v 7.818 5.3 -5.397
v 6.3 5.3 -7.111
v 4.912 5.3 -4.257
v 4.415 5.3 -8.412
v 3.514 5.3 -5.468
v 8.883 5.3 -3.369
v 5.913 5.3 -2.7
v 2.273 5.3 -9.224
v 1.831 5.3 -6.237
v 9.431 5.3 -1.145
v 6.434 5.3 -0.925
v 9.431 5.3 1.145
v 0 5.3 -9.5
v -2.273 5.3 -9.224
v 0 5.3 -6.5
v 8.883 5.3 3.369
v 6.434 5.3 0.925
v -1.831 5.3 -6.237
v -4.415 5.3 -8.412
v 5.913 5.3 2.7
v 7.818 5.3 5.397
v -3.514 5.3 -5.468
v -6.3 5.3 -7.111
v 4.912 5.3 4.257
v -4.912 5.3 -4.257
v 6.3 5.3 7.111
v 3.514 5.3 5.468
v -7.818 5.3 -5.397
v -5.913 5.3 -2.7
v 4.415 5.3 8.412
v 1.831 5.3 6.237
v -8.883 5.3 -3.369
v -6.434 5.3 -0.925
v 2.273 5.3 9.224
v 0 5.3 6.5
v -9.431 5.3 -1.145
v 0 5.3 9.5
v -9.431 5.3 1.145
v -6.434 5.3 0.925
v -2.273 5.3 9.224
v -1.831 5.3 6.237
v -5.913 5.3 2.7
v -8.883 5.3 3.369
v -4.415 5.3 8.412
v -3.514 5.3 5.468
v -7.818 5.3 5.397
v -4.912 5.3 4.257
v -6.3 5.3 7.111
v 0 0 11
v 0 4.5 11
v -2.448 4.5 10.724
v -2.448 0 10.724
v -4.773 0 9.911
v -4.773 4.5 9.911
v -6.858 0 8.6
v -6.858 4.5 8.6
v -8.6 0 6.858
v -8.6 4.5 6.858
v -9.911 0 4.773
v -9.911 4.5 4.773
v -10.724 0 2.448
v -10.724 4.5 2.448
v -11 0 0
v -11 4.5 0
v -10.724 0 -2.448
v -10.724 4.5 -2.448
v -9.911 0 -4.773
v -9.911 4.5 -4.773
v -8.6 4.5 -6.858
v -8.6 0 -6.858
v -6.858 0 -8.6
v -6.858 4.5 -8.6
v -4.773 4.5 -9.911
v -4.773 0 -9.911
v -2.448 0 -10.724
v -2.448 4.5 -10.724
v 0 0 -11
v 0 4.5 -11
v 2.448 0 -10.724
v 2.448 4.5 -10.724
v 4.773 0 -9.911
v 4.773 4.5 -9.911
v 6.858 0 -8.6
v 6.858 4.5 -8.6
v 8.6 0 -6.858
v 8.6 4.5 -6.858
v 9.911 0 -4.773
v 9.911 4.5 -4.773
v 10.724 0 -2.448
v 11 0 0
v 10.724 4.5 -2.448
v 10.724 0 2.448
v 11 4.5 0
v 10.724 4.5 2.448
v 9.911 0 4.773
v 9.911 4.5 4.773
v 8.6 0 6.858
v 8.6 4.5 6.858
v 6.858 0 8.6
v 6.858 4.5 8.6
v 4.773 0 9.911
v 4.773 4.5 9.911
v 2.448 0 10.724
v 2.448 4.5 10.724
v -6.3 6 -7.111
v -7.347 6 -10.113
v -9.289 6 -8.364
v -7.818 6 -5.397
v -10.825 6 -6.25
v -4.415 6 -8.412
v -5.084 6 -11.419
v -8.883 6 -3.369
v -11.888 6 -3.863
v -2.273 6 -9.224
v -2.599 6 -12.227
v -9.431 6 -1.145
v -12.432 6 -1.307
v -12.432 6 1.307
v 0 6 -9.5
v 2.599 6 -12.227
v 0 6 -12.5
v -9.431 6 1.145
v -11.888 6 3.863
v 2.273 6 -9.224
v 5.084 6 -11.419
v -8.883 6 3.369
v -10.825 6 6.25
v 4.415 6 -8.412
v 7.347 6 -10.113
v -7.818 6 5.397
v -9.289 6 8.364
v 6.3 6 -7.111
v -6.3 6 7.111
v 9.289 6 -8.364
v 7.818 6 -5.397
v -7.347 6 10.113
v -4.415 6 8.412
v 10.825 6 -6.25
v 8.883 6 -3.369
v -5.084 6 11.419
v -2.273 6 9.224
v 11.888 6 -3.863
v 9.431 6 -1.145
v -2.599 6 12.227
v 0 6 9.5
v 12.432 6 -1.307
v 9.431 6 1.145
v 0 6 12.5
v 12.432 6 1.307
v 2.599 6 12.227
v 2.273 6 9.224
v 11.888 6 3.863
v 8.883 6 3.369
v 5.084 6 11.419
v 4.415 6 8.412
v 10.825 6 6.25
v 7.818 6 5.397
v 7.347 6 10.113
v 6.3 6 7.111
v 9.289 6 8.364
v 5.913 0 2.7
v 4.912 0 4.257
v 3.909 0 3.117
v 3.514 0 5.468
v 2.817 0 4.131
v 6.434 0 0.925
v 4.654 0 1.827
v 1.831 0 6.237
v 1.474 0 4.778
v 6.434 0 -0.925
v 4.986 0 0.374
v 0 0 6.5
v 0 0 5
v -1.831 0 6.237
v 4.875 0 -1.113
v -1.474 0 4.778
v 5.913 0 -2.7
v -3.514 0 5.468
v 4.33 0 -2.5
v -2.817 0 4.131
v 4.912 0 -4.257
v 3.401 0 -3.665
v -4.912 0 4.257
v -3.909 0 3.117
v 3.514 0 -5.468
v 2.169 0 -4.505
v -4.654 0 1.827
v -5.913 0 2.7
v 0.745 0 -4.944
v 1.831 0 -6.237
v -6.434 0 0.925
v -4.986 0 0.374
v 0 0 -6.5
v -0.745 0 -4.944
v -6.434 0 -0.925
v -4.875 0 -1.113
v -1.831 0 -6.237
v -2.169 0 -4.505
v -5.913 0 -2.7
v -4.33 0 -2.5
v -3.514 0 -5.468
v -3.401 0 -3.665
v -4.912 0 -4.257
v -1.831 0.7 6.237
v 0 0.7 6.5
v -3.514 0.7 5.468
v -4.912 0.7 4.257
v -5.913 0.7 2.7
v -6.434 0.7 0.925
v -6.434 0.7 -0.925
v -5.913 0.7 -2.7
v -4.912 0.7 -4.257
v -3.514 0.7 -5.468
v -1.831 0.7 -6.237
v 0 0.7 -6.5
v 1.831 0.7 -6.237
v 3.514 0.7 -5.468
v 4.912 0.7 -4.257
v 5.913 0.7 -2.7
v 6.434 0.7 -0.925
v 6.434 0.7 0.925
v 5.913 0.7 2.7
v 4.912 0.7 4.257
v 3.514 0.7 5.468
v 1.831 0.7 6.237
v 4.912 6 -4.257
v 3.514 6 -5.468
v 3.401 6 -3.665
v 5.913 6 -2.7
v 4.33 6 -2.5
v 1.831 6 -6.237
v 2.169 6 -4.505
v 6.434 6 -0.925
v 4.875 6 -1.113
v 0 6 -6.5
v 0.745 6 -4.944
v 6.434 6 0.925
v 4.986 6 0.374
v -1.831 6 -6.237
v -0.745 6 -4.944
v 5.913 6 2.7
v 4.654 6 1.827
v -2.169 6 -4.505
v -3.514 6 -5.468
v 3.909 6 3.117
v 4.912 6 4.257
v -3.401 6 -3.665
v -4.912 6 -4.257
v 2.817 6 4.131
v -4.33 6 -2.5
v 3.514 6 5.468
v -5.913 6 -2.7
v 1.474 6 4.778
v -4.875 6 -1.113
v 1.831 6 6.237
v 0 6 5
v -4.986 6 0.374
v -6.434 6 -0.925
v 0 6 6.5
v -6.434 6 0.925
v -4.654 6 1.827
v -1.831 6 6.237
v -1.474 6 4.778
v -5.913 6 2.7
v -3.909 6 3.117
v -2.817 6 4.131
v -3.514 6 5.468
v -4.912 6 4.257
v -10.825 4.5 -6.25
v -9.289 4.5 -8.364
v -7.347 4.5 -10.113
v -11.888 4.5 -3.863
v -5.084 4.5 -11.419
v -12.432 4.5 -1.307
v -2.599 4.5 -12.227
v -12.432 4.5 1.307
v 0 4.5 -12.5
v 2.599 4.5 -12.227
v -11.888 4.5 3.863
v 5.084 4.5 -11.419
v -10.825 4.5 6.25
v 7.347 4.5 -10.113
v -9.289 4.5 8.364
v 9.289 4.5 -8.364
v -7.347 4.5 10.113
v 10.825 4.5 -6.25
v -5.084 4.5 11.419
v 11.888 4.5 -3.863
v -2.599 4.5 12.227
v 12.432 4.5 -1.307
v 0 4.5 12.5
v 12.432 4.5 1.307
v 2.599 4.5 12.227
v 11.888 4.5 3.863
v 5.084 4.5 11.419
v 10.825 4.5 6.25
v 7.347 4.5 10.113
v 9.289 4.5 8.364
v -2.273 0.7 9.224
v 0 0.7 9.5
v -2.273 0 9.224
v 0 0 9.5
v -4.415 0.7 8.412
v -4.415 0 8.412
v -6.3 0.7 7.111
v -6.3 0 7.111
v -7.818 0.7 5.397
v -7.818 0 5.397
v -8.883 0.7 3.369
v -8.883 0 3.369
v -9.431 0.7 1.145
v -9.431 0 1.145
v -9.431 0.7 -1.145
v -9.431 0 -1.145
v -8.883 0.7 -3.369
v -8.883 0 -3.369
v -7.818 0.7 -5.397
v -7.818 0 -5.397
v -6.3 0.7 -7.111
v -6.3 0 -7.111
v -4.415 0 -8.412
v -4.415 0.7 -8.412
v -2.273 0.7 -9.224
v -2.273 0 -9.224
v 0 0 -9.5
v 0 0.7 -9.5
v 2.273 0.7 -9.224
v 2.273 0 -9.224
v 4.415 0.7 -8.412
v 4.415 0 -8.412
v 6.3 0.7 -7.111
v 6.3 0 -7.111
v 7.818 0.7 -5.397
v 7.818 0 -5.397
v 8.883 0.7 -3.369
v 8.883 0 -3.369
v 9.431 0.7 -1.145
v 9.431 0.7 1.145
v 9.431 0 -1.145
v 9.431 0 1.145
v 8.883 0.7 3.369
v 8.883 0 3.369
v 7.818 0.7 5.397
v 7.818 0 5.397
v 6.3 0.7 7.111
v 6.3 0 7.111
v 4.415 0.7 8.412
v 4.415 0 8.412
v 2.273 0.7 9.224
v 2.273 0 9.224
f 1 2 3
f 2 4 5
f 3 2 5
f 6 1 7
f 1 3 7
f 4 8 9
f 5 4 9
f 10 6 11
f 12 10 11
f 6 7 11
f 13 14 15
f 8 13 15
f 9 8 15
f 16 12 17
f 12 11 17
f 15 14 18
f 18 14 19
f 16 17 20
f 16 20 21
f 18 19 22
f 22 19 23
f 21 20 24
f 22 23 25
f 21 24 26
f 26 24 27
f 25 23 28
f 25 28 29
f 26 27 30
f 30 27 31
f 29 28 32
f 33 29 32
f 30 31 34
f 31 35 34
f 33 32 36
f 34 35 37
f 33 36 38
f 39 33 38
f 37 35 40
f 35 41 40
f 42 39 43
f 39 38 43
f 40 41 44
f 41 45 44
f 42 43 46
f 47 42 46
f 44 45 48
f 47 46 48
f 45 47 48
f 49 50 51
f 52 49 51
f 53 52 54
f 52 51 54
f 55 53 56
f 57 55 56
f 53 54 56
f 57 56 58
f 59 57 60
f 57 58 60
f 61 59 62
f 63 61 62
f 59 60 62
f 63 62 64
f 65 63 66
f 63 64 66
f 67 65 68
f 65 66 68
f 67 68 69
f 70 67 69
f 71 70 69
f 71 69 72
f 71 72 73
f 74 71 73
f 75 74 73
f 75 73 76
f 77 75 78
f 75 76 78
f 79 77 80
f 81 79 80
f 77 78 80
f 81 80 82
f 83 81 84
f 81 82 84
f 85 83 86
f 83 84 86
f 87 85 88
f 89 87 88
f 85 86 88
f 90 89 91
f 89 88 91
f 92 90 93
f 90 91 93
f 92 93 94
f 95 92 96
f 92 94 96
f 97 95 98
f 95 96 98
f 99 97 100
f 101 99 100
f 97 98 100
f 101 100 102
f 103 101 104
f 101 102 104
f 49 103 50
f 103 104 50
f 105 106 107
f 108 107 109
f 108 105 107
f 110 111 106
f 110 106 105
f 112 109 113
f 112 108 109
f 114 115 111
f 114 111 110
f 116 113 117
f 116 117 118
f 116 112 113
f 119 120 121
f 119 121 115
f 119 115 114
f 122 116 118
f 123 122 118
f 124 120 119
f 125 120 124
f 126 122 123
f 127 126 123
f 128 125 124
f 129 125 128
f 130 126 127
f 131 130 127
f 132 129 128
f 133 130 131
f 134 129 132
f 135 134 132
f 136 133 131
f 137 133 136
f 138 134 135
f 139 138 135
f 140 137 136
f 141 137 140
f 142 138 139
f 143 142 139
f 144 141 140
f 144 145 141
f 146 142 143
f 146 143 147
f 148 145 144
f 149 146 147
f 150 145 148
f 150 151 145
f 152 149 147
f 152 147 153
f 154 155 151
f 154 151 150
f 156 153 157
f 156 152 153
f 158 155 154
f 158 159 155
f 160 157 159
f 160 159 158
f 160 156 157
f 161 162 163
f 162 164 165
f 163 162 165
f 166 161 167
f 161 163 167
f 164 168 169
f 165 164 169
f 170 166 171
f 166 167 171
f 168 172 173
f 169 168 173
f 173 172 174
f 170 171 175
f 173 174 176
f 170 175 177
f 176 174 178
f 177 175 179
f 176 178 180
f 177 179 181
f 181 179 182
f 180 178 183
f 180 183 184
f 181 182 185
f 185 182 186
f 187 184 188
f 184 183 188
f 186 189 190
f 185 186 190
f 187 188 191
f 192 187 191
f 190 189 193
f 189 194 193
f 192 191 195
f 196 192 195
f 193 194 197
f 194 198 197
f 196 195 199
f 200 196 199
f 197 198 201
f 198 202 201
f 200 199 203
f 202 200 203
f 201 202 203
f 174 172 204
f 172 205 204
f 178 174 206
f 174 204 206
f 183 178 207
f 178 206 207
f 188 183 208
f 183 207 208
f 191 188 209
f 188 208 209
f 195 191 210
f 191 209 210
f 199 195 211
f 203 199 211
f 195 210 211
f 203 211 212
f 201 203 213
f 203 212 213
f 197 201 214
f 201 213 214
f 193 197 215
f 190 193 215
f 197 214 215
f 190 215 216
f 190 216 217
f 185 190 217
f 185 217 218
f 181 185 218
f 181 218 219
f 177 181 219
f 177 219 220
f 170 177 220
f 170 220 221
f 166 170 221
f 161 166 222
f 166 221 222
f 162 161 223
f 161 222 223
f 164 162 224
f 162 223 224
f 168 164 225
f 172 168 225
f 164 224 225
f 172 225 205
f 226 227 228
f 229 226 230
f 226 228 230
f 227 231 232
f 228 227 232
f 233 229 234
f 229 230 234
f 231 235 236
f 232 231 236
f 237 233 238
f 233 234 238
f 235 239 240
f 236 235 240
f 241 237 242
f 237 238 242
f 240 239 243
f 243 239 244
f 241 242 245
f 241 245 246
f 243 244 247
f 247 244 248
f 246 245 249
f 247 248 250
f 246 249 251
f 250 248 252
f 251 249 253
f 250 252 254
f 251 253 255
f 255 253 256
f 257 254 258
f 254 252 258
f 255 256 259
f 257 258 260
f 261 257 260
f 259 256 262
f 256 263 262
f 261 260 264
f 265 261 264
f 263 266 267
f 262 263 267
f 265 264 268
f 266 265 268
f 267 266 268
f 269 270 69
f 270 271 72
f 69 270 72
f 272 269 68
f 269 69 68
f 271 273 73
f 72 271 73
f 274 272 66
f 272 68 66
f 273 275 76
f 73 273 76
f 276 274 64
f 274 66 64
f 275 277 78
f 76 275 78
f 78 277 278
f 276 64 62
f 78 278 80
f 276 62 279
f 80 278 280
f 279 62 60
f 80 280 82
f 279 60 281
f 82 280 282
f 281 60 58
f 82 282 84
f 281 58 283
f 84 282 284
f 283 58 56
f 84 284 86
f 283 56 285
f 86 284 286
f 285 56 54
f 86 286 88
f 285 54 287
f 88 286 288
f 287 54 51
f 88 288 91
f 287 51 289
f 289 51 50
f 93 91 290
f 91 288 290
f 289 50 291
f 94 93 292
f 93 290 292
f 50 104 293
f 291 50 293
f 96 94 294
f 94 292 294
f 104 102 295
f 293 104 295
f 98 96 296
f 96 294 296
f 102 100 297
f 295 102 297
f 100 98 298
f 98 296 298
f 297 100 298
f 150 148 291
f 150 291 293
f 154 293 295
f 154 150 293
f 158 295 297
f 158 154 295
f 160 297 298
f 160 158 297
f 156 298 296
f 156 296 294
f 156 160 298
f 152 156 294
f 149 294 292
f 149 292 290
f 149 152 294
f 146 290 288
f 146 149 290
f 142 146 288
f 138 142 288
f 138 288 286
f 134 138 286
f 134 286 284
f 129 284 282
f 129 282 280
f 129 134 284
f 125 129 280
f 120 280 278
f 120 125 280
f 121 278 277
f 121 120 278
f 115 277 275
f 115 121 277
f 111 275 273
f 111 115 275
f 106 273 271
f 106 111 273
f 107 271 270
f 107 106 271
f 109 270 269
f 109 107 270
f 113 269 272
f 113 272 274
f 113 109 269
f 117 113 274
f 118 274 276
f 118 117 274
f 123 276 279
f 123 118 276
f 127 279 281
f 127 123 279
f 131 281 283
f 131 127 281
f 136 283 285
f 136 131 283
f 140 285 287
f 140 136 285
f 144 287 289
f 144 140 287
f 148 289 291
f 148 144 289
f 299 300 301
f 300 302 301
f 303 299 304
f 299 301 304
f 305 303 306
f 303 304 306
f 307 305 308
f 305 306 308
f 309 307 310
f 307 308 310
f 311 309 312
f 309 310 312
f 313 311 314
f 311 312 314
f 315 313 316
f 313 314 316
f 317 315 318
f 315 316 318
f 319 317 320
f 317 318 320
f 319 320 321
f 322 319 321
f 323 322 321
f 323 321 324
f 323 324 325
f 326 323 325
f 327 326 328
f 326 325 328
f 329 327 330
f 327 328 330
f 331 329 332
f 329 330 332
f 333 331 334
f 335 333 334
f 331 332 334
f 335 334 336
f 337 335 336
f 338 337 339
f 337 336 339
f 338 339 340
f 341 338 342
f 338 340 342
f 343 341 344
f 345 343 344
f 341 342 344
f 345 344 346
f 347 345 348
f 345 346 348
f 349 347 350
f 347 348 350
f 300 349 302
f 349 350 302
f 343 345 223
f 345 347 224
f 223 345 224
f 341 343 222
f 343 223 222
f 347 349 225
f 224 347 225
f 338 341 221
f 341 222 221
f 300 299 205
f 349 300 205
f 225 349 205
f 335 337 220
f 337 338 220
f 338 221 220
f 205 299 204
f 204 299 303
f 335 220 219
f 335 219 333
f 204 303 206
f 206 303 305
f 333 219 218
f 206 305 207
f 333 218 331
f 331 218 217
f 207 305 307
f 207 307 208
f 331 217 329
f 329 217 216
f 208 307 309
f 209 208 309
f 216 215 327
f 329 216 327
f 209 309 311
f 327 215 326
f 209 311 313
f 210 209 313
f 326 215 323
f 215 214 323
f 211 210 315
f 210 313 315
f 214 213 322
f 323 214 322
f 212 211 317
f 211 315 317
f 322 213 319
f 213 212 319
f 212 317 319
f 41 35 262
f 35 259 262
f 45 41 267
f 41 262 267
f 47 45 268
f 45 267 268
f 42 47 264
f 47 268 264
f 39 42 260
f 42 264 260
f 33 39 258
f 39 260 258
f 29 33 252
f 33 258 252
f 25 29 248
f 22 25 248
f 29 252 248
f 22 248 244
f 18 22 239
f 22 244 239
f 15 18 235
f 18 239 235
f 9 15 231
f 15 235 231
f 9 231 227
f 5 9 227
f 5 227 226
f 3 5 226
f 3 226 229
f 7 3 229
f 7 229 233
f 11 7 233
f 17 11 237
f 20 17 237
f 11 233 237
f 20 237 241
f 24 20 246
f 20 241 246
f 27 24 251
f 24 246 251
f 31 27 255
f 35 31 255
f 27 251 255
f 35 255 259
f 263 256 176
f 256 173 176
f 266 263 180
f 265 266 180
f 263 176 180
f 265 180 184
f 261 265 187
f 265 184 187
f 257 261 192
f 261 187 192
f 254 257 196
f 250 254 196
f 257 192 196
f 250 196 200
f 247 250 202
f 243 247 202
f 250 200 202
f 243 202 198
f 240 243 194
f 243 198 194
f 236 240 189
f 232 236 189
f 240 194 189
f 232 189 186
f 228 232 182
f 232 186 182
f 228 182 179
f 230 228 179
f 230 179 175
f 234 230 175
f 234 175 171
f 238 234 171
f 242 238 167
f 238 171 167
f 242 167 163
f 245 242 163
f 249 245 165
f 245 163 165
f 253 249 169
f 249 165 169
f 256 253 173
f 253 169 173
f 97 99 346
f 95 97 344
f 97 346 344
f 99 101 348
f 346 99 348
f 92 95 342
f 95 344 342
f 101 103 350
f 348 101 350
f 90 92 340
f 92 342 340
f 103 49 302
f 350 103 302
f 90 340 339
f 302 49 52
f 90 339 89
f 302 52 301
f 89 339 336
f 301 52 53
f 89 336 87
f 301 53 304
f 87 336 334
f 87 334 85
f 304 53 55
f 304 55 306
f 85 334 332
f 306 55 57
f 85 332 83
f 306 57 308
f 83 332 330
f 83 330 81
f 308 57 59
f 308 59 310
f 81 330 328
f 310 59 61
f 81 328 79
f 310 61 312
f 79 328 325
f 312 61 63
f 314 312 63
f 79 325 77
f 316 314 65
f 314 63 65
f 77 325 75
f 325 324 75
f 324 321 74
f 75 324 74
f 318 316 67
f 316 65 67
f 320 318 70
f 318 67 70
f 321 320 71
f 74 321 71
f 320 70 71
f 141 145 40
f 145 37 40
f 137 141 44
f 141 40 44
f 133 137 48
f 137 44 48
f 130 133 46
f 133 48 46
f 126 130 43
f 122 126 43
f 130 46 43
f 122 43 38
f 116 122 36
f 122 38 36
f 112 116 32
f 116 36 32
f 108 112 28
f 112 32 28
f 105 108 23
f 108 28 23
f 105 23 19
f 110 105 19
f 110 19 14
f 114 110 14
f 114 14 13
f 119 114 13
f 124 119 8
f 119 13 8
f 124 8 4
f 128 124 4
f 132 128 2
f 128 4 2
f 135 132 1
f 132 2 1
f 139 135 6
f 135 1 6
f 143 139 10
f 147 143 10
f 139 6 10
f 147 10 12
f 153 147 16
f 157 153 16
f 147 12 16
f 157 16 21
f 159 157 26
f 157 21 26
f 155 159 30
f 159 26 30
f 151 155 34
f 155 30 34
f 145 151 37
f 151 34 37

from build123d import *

# Parameters (mm, degrees)
SKETCH_2_R      = 12.5
SKETCH_2_R_2    = 11
EXTRUDE_1_DEPTH = 1.5


with BuildPart() as part:
    # 草图1 → 旋转1 (revolve)
    with BuildSketch(Plane.XY, mode=Mode.PRIVATE) as revolve_1_sk:
        Polygon((5, 6), (5, 0), (6.5, 0), (6.5, 0.7), (9.5, 0.7), (9.5, 0), (11, 0), (11, 6), (9.5, 6), (9.5, 5.3), (6.5, 5.3), (6.5, 6), align=None)
    revolve(revolve_1_sk.sketch.rotate(Axis((0, 4.611296038, 0), (0, -1, 0)), 90), axis=Axis((0, 4.611296038, 0), (0, -1, 0)))

    # 草图2 → 凸台-拉伸1 (add)
    with BuildSketch(Plane(origin=(0, 6, 0), x_dir=(1, 0, 0), z_dir=(0, 1, 0))):
        with Locations(Location((0, 0, 0), (0, 0, 270))):
            Circle(SKETCH_2_R)
        with Locations(Location((0, 0, 0), (0, 0, 270))):
            Circle(SKETCH_2_R_2, mode=Mode.SUBTRACT)
    extrude(amount=-EXTRUDE_1_DEPTH)


solid = part.part
